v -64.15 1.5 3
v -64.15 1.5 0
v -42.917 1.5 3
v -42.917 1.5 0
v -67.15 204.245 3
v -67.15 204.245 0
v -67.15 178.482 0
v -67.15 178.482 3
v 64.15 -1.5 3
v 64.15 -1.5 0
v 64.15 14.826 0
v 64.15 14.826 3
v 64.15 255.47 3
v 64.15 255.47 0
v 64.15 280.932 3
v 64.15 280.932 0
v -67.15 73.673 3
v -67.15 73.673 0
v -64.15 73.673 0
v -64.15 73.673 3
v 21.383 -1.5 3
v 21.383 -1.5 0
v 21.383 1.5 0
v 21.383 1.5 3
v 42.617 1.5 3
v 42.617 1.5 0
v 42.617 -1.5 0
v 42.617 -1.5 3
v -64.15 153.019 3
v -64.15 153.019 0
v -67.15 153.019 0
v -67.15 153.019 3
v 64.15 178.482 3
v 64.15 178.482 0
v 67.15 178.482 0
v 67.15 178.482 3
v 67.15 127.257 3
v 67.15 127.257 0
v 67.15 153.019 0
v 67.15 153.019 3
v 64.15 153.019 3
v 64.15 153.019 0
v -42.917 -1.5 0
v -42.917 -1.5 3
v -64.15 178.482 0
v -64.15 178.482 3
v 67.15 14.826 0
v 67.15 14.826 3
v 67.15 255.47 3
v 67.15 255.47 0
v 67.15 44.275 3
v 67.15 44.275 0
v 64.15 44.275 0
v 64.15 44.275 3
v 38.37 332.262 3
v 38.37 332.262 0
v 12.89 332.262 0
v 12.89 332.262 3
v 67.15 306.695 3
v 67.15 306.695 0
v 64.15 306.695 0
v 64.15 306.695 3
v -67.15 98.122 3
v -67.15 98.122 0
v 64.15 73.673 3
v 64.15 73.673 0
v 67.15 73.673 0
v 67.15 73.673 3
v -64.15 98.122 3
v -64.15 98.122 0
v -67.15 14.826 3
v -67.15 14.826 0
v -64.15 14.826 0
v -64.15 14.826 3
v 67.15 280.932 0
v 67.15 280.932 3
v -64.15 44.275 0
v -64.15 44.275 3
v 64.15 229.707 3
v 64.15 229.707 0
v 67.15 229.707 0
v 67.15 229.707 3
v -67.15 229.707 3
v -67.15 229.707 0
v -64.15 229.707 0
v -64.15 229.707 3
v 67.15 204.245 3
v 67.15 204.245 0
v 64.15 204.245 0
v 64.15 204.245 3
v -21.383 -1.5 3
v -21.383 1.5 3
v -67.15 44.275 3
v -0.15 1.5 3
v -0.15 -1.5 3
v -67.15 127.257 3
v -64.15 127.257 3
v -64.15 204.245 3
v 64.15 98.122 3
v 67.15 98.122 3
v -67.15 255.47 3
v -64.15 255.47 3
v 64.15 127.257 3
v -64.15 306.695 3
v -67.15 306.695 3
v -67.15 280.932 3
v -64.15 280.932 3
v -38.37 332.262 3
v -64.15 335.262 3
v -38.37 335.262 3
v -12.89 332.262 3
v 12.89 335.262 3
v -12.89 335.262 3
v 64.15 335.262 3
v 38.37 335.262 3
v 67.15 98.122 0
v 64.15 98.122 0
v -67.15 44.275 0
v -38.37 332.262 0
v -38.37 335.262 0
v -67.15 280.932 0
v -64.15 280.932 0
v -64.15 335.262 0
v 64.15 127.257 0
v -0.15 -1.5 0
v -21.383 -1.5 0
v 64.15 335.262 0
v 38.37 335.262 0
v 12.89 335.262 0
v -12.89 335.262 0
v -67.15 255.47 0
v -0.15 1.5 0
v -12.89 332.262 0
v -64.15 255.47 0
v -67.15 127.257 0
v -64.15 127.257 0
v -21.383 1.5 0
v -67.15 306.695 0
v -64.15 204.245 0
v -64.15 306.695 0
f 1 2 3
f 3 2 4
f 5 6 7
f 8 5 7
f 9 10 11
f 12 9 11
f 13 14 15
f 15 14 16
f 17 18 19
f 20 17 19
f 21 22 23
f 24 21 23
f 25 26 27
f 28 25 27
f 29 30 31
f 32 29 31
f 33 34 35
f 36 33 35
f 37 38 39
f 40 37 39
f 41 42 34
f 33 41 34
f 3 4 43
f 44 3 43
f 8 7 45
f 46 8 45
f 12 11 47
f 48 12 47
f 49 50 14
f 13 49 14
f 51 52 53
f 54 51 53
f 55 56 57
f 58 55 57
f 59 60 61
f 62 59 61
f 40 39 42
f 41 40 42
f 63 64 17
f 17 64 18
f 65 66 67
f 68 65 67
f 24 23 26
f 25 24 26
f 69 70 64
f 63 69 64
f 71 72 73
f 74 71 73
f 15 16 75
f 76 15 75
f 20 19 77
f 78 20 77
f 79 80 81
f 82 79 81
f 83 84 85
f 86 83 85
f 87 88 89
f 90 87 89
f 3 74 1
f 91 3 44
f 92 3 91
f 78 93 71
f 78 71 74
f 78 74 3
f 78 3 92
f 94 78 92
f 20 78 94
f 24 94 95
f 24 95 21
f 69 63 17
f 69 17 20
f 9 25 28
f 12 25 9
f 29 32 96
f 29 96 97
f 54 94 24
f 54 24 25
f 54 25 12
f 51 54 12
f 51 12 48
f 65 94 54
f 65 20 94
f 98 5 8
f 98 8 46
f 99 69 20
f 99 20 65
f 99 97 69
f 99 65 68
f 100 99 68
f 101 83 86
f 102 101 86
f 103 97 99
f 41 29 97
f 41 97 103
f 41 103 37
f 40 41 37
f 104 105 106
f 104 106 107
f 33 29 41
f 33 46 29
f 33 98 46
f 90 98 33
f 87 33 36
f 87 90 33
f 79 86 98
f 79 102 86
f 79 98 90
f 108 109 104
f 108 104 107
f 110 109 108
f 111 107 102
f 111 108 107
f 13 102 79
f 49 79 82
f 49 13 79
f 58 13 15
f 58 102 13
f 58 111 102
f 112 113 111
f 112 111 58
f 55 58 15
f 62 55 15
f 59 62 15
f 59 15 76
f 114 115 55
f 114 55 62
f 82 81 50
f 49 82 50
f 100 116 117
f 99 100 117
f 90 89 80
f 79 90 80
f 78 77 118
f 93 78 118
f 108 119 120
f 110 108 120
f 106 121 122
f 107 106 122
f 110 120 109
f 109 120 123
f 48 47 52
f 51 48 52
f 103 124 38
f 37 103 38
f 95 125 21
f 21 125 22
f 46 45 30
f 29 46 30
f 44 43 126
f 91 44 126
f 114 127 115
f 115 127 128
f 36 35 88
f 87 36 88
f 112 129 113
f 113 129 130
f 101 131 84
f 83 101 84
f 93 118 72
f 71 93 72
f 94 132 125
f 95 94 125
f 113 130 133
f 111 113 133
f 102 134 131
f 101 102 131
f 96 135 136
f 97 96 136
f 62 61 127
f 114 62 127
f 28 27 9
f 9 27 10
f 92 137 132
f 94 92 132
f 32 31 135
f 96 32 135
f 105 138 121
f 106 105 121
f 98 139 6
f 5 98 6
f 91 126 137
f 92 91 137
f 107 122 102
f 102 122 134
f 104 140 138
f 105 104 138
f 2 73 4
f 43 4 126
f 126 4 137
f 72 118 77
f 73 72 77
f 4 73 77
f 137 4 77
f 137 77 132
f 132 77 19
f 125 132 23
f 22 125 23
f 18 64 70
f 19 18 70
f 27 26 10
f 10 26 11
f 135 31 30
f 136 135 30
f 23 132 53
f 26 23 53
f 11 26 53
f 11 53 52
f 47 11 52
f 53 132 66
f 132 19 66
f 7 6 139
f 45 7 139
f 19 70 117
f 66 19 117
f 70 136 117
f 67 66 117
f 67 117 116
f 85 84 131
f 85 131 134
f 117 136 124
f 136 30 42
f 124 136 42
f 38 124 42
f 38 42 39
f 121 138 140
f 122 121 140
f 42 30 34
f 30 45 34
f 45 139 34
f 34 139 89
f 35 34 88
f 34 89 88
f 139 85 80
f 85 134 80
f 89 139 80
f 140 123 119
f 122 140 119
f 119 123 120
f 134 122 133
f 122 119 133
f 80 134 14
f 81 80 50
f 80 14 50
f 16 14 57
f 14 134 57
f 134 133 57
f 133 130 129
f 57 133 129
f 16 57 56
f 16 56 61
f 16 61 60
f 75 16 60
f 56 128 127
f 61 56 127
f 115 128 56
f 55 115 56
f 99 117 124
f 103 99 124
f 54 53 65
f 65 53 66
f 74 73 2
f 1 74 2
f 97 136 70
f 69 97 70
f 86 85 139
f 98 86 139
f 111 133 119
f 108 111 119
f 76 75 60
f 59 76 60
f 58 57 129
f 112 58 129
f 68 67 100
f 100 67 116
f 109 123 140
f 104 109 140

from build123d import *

# Parameters (mm, degrees)
BOSS_EXTRUDE1_DEPTH = 3


with BuildPart() as part:
    # Sketch1 → Boss-Extrude1 (new body)
    with BuildSketch(Plane.XY):
        Polygon((64.15, 153.019232641), (64.15, 178.481870793), (67.15, 178.481870793), (67.15, 204.244508944), (64.15, 204.244508944), (64.15, 229.707147096), (67.15, 229.707147096), (67.15, 255.469785247), (64.15, 255.469785247), (64.15, 280.932423398), (67.15, 280.932423398), (67.15, 306.69506155), (64.15, 306.69506155), (64.15, 335.261916889), (38.37, 335.261916889), (38.37, 332.261916889), (12.89, 332.261916889), (12.89, 335.261916889), (-12.89, 335.261916889), (-12.89, 332.261916889), (-38.37, 332.261916889), (-38.37, 335.261916889), (-64.15, 335.261916889), (-64.15, 306.69506155), (-67.15, 306.69506155), (-67.15, 280.932423398), (-64.15, 280.932423398), (-64.15, 255.469785247), (-67.15, 255.469785247), (-67.15, 229.707147096), (-64.15, 229.707147096), (-64.15, 204.244508944), (-67.15, 204.244508944), (-67.15, 178.481870793), (-64.15, 178.481870793), (-64.15, 153.019232641), (-67.15, 153.019232641), (-67.15, 127.25659449), (-64.15, 127.25659449), (-64.15, 98.12172779), (-67.15, 98.12172779), (-67.15, 73.67315636), (-64.15, 73.67315636), (-64.15, 44.27458493), (-67.15, 44.27458493), (-67.15, 14.8260135), (-64.15, 14.8260135), (-64.15, 1.5), (-42.916666667, 1.5), (-42.916666667, -1.5), (-21.383333333, -1.5), (-21.383333333, 1.5), (-0.15, 1.5), (-0.15, -1.5), (21.383333333, -1.5), (21.383333333, 1.5), (42.616666667, 1.5), (42.616666667, -1.5), (64.15, -1.5), (64.15, 14.8260135), (67.15, 14.8260135), (67.15, 44.27458493), (64.15, 44.27458493), (64.15, 73.67315636), (67.15, 73.67315636), (67.15, 98.12172779), (64.15, 98.12172779), (64.15, 127.25659449), (67.15, 127.25659449), (67.15, 153.019232641), align=None)
    extrude(amount=BOSS_EXTRUDE1_DEPTH)


solid = part.part
